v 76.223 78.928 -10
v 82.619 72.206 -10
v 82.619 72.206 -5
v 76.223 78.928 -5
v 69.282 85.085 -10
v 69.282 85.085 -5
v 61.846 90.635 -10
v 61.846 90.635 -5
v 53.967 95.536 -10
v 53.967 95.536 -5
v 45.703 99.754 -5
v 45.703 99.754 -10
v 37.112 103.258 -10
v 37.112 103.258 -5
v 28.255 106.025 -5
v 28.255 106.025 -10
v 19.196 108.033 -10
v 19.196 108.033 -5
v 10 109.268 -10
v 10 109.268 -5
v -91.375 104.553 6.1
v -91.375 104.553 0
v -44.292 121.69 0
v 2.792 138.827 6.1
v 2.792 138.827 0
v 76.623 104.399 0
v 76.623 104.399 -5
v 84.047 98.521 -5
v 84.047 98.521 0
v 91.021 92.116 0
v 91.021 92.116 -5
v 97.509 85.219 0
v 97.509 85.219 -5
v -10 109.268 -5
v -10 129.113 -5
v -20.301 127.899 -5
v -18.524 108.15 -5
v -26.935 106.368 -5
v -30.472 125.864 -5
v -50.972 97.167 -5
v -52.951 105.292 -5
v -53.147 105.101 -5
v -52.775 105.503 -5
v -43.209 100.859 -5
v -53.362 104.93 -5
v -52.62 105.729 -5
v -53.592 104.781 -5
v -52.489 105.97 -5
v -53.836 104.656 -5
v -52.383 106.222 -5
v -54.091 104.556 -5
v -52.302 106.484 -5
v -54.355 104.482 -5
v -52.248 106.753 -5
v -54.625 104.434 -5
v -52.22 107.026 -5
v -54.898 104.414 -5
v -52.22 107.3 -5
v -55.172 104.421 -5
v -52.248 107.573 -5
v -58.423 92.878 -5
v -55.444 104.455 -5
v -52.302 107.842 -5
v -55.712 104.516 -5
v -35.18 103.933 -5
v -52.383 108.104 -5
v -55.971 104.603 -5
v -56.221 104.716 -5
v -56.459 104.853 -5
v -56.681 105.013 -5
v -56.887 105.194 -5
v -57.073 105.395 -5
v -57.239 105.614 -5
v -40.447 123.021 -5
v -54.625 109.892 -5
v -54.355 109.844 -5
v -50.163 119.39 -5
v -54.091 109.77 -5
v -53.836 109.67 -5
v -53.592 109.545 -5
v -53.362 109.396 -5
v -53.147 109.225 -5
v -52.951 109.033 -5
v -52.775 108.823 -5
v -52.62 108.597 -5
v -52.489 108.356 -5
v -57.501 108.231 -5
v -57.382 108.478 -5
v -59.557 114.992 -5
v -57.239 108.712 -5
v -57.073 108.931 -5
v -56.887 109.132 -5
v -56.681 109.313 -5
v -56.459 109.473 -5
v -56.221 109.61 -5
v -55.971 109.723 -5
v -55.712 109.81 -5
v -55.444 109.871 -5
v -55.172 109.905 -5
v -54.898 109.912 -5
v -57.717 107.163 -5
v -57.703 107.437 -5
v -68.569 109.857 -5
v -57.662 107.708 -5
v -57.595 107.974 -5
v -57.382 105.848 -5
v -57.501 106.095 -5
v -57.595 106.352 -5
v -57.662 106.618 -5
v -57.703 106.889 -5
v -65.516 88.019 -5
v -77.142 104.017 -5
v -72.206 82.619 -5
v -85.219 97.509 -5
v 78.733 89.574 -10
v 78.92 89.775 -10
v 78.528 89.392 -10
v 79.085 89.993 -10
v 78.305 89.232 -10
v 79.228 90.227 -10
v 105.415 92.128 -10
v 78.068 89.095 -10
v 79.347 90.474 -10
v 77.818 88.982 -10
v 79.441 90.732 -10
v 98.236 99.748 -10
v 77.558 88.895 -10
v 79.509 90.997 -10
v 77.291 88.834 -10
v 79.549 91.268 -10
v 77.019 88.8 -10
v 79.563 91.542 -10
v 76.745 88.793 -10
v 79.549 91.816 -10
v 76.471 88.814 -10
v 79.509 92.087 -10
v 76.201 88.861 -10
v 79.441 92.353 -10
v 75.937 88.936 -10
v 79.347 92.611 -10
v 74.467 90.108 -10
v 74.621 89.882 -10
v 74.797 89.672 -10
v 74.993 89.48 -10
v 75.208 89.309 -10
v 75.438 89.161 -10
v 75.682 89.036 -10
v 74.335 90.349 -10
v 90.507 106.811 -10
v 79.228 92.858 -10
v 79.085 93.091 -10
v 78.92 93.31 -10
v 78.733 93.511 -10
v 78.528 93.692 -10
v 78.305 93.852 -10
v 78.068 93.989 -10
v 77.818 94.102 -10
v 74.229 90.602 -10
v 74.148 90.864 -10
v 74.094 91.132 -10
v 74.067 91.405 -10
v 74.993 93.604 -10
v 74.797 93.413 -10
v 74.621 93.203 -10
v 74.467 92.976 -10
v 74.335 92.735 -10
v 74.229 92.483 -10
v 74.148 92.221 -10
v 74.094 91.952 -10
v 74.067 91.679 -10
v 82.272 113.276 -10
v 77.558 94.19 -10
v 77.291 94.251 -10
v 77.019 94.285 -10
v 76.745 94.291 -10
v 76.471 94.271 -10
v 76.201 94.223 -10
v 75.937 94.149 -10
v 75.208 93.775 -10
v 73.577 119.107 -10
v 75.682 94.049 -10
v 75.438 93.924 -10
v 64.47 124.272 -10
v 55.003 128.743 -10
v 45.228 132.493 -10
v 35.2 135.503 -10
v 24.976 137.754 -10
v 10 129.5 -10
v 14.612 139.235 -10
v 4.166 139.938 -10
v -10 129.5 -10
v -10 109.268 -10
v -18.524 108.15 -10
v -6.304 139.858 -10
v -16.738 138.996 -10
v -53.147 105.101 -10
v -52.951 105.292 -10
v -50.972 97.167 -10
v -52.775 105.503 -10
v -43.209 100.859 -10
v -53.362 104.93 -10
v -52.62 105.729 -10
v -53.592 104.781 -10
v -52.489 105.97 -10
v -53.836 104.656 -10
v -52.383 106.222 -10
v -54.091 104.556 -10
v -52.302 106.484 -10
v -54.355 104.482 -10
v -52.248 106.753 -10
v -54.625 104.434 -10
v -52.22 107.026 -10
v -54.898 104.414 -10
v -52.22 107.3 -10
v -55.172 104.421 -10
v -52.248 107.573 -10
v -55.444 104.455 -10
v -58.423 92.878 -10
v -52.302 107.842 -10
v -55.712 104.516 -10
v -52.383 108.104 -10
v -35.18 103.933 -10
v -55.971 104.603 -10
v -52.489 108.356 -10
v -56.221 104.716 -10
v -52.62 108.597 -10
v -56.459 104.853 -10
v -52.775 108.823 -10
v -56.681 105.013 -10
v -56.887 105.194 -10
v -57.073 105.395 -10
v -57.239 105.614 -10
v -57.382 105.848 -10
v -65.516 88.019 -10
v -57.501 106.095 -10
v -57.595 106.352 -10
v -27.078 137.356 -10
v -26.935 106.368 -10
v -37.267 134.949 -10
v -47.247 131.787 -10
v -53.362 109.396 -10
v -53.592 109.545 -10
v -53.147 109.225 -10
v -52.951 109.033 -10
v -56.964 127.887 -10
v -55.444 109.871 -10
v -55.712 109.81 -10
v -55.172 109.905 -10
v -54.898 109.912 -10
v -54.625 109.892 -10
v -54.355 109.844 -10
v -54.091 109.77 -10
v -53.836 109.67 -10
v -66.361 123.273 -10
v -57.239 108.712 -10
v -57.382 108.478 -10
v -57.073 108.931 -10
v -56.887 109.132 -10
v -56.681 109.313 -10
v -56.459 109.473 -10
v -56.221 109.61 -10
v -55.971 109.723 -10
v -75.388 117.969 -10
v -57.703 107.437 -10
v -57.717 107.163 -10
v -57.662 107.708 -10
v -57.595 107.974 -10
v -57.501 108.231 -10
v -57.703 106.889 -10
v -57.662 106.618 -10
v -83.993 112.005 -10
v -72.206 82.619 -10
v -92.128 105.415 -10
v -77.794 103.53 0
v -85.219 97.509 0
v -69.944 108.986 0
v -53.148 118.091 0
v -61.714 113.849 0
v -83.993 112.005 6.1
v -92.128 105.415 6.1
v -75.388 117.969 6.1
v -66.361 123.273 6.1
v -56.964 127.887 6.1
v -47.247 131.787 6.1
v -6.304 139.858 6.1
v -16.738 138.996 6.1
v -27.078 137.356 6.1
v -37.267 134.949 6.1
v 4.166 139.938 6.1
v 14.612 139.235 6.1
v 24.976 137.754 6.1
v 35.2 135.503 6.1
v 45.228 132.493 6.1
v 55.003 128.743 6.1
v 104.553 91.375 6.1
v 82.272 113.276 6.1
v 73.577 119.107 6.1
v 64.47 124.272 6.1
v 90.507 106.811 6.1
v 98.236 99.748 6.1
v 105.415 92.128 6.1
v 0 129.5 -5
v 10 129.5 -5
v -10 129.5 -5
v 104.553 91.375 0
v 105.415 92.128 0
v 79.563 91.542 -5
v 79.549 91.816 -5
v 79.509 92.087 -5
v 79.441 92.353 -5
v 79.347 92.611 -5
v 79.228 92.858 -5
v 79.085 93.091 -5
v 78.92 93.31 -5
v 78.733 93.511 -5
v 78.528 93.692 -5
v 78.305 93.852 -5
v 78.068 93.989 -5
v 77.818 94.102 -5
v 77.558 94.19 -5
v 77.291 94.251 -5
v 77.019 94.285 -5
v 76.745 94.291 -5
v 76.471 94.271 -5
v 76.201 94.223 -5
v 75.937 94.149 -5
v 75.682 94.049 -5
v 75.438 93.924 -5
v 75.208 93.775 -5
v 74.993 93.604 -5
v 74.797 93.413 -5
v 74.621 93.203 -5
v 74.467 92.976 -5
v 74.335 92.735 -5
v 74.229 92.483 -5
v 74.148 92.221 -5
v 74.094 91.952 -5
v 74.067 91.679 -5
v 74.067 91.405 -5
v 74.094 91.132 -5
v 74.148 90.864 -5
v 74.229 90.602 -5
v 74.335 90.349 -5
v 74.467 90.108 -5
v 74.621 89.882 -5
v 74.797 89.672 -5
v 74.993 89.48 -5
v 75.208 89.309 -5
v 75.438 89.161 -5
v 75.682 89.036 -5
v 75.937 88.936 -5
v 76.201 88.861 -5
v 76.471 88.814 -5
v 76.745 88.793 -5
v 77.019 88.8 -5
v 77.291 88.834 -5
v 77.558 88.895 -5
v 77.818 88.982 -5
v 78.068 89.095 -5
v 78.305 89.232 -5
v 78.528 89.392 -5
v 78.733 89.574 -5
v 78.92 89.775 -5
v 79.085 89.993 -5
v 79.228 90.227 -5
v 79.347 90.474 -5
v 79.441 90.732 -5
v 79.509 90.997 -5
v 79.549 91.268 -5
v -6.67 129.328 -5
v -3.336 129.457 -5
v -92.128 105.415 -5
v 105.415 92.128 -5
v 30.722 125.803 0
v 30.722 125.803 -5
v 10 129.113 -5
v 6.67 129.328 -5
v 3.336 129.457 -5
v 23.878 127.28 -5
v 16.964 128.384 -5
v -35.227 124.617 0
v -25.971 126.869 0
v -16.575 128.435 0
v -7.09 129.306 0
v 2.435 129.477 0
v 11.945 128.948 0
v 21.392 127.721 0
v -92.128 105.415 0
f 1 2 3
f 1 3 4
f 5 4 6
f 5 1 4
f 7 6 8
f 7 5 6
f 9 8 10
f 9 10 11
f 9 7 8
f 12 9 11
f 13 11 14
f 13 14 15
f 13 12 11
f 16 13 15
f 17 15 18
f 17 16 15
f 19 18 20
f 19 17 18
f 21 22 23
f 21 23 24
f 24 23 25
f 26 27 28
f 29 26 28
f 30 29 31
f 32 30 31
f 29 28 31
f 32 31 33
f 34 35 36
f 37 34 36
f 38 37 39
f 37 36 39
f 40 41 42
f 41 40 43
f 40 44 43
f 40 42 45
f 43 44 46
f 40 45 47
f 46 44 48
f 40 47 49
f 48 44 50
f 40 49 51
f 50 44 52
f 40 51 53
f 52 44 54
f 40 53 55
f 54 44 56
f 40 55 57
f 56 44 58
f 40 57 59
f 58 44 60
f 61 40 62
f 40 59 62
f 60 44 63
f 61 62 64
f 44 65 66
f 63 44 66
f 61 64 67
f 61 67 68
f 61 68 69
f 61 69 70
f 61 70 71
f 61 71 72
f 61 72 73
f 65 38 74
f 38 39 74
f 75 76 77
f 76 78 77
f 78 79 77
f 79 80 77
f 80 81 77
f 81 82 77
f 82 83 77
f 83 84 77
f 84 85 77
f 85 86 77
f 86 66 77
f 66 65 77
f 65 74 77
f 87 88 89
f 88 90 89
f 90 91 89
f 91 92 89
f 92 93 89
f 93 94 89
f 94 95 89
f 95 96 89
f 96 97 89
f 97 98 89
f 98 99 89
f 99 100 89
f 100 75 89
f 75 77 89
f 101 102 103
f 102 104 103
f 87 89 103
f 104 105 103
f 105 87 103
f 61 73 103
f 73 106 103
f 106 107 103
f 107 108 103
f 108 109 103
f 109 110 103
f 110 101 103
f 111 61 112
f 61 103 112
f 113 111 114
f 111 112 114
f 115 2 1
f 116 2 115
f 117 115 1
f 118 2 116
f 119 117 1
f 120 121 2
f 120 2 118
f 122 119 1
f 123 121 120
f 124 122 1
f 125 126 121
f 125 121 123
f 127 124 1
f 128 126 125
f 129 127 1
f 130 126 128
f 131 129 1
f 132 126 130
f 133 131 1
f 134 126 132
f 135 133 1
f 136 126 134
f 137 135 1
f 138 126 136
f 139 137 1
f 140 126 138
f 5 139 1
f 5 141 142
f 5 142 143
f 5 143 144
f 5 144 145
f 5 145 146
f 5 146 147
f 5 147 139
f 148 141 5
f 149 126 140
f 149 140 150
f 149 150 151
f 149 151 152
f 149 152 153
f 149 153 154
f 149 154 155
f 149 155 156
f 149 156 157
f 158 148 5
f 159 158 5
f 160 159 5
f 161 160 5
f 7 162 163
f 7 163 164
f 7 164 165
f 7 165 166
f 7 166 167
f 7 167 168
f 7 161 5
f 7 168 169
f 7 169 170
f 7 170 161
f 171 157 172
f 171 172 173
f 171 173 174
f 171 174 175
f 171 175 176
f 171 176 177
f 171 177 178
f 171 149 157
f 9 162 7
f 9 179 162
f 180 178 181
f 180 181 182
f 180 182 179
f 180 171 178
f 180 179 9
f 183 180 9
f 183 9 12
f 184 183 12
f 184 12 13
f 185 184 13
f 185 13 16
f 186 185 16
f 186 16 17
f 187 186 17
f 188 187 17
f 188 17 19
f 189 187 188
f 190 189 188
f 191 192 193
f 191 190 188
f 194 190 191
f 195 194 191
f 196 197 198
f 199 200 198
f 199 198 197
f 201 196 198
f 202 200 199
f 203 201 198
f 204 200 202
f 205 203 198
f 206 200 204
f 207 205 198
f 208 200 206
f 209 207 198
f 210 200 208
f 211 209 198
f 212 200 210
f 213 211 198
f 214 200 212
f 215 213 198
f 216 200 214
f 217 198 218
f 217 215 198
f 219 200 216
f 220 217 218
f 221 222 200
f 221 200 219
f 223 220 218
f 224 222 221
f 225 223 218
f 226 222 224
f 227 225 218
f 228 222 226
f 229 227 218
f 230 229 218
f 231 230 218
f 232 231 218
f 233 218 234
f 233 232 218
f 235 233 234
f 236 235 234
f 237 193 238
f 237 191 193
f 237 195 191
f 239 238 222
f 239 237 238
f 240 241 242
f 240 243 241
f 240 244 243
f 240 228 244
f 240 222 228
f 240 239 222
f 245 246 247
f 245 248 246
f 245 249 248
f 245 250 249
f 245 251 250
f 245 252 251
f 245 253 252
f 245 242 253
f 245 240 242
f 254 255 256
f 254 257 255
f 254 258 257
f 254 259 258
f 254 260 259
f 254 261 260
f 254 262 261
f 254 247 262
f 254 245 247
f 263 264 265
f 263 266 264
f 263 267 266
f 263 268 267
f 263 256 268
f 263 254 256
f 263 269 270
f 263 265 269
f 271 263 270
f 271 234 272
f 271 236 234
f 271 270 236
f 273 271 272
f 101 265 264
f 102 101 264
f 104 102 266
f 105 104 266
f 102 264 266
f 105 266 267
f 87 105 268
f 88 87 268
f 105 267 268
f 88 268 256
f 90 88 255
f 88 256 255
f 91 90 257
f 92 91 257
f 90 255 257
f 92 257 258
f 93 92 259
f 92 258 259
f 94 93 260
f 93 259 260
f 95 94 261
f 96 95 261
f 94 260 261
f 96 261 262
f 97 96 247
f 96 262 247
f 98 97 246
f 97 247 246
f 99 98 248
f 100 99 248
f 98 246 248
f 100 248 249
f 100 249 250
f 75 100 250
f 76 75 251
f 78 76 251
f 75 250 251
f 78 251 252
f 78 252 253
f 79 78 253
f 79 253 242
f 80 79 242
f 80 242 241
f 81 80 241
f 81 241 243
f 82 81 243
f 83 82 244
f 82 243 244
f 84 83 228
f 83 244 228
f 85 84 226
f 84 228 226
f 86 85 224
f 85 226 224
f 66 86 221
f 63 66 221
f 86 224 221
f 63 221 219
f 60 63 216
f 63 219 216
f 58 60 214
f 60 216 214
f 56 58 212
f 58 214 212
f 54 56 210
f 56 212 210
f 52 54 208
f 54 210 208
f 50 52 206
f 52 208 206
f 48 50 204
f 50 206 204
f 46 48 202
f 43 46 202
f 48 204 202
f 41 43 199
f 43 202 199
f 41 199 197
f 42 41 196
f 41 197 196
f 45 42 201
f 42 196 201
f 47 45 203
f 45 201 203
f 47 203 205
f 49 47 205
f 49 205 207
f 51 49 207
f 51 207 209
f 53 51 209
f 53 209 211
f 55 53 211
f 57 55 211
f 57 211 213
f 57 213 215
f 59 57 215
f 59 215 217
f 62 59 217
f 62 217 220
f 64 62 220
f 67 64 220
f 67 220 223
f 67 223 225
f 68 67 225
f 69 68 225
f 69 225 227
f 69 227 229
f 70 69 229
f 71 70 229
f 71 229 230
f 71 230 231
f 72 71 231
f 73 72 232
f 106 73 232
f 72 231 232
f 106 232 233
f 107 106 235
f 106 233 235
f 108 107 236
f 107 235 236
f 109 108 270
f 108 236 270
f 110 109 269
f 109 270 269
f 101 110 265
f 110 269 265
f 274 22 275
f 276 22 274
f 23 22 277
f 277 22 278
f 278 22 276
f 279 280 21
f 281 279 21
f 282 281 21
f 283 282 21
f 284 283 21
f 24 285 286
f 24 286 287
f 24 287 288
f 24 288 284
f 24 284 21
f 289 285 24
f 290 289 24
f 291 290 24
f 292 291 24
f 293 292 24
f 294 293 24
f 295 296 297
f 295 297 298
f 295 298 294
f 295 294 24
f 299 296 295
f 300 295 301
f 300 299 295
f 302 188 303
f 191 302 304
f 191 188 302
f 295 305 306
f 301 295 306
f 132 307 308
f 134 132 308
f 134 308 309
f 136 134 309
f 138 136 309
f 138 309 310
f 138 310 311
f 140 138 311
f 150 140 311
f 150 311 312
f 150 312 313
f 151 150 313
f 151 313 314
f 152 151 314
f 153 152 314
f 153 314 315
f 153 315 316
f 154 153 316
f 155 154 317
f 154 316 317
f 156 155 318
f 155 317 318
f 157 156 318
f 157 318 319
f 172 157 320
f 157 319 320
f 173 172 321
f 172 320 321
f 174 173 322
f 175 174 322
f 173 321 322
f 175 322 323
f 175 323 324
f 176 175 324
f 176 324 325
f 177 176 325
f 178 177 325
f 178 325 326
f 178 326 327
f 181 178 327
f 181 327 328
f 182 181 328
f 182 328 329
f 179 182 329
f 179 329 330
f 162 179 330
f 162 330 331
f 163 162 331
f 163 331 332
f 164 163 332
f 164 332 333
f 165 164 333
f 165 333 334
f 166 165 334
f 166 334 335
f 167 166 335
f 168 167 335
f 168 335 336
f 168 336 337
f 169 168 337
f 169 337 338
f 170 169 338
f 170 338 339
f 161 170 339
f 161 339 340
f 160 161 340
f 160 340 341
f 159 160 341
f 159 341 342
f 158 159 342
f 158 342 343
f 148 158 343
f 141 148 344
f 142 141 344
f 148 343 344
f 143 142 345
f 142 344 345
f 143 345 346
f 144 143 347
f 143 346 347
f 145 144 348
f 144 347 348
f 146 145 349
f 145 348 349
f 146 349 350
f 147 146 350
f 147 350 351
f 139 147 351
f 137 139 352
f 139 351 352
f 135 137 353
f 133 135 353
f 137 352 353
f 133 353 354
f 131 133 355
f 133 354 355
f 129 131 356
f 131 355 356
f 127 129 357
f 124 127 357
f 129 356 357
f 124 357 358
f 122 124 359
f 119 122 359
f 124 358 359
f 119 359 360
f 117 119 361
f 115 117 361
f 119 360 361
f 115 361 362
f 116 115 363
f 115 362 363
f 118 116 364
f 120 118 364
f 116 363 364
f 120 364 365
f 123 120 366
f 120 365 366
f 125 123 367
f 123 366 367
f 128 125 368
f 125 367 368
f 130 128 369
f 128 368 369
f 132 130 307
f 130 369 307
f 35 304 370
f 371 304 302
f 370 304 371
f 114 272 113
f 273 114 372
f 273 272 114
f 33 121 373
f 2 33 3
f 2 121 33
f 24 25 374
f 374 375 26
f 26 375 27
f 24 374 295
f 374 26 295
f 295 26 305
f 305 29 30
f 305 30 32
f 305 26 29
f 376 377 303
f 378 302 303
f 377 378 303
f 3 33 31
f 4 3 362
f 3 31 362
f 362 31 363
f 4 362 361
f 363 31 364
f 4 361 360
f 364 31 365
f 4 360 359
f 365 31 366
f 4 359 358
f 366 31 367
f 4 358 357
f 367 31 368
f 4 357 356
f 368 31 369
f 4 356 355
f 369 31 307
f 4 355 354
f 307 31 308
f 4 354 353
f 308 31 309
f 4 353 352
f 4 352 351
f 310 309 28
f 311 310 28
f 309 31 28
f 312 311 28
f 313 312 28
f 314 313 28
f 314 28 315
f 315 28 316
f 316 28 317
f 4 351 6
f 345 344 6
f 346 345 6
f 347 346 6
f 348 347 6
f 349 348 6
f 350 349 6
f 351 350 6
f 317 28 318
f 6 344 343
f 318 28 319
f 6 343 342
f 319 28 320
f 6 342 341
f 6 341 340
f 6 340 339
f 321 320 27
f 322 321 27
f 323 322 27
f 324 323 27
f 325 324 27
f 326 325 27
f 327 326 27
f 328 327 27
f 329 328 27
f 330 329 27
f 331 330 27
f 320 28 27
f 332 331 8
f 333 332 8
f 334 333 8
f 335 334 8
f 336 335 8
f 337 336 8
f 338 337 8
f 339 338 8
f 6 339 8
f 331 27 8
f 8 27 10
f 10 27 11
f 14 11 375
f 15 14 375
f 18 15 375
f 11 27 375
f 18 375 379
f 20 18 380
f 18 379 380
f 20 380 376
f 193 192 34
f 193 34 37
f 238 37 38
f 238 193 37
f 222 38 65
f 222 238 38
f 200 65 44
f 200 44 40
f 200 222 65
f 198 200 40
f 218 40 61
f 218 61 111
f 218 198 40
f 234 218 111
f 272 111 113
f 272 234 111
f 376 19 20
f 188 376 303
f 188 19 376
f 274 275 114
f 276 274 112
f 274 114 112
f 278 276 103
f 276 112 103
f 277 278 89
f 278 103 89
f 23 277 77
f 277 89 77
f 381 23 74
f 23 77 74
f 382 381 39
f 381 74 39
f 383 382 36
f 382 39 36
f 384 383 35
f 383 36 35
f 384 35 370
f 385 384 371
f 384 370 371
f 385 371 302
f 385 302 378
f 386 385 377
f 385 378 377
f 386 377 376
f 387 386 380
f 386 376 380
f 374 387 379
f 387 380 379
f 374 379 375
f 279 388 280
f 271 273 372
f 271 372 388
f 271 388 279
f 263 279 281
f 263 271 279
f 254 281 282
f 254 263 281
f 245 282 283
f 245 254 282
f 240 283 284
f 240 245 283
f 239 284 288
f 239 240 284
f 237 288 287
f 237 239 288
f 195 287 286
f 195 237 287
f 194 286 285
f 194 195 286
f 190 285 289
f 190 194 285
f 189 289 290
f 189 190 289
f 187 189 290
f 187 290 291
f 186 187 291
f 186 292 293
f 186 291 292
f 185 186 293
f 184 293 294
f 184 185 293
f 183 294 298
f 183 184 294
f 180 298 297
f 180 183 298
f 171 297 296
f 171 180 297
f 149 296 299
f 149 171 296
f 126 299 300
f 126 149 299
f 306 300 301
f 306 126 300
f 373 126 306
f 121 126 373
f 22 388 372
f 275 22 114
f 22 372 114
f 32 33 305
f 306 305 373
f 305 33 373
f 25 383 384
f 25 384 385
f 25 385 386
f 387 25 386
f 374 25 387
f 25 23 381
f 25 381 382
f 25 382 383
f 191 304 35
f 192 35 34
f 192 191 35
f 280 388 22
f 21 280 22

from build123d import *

# Parameters (mm, degrees)
BOSS_EXTRUDE1_DEPTH = 6.1
BOSS_EXTRUDE4_START = -5
BOSS_EXTRUDE4_DEPTH = 5
BOSS_EXTRUDE5_START = 5
SKETCH6_R           = 2.75
BOSS_EXTRUDE5_DEPTH = 5
SKETCH7_R           = 2.75
CUT_EXTRUDE1_DEPTH  = 176.534516689


with BuildPart() as part:
    # Sketch4 → Boss-Extrude1 (new body)
    with BuildSketch(Plane.XY):
        with BuildLine():
            Line((2.791805242, 138.827155544), (104.55323324, 91.375022364))
            Line((104.55323324, 91.375022364), (105.415210237, 92.128353131))
            ThreePointArc((105.415210237, 92.128353131), (9.395226761, 139.684393237), (-92.128353131, 105.415210237))
            Line((-92.128353131, 105.415210237), (-91.375022364, 104.55323324))
            Line((-91.375022364, 104.55323324), (2.791805242, 138.827155544))
        make_face()
    extrude(amount=BOSS_EXTRUDE1_DEPTH)

    # Sketch5 → Boss-Extrude4 (add)
    with BuildSketch(Plane.XY.offset(BOSS_EXTRUDE4_START)):
        with BuildLine():
            Line((30.722164617, 125.803015072), (76.622873865, 104.399162835))
            ThreePointArc((76.622873865, 104.399162835), (87.59255508, 95.382358403), (97.50906947, 85.218726646))
            Line((97.50906947, 85.218726646), (105.415210237, 92.128353131))
            ThreePointArc((105.415210237, 92.128353131), (9.395226761, 139.684393237), (-92.128353131, 105.415210237))
            Line((-92.128353131, 105.415210237), (-85.218726646, 97.50906947))
            ThreePointArc((-85.218726646, 97.50906947), (-30.701883618, 125.807966132), (30.722164617, 125.803015072))
        make_face()
    extrude(amount=BOSS_EXTRUDE4_DEPTH)

    # Sketch6 → Boss-Extrude5 (add)
    with BuildSketch(Plane(origin=(0, 0, -5), x_dir=(-1, 0, 0), z_dir=(0, 0, -1)).offset(BOSS_EXTRUDE5_START)):
        with BuildLine():
            Line((-10, 129.5), (10, 129.5))
            Line((10, 129.5), (10, 109.268365161))
            ThreePointArc((10, 109.268365161), (43.208620922, 100.85926186), (72.205596766, 82.619171024))
            Line((72.205596766, 82.619171024), (92.128353131, 105.415210237))
            ThreePointArc((92.128353131, 105.415210237), (-9.395226761, 139.684393237), (-105.415210237, 92.128353131))
            Line((-105.415210237, 92.128353131), (-82.619171024, 72.205596766))
            ThreePointArc((-82.619171024, 72.205596766), (-49.879754516, 97.732214313), (-10, 109.268365161))
            Line((-10, 109.268365161), (-10, 129.5))
        make_face()
        with Locations((54.966796439, 107.162966034)):
            Circle(SKETCH6_R, mode=Mode.SUBTRACT)
    extrude(amount=-BOSS_EXTRUDE5_DEPTH)

    # Sketch7 → Cut-Extrude1 (cut, through all)
    with BuildSketch(Plane.XY):
        with Locations((76.813119358, 91.542310953)):
            Circle(SKETCH7_R)
    extrude(amount=-CUT_EXTRUDE1_DEPTH, mode=Mode.SUBTRACT)


solid = part.part
